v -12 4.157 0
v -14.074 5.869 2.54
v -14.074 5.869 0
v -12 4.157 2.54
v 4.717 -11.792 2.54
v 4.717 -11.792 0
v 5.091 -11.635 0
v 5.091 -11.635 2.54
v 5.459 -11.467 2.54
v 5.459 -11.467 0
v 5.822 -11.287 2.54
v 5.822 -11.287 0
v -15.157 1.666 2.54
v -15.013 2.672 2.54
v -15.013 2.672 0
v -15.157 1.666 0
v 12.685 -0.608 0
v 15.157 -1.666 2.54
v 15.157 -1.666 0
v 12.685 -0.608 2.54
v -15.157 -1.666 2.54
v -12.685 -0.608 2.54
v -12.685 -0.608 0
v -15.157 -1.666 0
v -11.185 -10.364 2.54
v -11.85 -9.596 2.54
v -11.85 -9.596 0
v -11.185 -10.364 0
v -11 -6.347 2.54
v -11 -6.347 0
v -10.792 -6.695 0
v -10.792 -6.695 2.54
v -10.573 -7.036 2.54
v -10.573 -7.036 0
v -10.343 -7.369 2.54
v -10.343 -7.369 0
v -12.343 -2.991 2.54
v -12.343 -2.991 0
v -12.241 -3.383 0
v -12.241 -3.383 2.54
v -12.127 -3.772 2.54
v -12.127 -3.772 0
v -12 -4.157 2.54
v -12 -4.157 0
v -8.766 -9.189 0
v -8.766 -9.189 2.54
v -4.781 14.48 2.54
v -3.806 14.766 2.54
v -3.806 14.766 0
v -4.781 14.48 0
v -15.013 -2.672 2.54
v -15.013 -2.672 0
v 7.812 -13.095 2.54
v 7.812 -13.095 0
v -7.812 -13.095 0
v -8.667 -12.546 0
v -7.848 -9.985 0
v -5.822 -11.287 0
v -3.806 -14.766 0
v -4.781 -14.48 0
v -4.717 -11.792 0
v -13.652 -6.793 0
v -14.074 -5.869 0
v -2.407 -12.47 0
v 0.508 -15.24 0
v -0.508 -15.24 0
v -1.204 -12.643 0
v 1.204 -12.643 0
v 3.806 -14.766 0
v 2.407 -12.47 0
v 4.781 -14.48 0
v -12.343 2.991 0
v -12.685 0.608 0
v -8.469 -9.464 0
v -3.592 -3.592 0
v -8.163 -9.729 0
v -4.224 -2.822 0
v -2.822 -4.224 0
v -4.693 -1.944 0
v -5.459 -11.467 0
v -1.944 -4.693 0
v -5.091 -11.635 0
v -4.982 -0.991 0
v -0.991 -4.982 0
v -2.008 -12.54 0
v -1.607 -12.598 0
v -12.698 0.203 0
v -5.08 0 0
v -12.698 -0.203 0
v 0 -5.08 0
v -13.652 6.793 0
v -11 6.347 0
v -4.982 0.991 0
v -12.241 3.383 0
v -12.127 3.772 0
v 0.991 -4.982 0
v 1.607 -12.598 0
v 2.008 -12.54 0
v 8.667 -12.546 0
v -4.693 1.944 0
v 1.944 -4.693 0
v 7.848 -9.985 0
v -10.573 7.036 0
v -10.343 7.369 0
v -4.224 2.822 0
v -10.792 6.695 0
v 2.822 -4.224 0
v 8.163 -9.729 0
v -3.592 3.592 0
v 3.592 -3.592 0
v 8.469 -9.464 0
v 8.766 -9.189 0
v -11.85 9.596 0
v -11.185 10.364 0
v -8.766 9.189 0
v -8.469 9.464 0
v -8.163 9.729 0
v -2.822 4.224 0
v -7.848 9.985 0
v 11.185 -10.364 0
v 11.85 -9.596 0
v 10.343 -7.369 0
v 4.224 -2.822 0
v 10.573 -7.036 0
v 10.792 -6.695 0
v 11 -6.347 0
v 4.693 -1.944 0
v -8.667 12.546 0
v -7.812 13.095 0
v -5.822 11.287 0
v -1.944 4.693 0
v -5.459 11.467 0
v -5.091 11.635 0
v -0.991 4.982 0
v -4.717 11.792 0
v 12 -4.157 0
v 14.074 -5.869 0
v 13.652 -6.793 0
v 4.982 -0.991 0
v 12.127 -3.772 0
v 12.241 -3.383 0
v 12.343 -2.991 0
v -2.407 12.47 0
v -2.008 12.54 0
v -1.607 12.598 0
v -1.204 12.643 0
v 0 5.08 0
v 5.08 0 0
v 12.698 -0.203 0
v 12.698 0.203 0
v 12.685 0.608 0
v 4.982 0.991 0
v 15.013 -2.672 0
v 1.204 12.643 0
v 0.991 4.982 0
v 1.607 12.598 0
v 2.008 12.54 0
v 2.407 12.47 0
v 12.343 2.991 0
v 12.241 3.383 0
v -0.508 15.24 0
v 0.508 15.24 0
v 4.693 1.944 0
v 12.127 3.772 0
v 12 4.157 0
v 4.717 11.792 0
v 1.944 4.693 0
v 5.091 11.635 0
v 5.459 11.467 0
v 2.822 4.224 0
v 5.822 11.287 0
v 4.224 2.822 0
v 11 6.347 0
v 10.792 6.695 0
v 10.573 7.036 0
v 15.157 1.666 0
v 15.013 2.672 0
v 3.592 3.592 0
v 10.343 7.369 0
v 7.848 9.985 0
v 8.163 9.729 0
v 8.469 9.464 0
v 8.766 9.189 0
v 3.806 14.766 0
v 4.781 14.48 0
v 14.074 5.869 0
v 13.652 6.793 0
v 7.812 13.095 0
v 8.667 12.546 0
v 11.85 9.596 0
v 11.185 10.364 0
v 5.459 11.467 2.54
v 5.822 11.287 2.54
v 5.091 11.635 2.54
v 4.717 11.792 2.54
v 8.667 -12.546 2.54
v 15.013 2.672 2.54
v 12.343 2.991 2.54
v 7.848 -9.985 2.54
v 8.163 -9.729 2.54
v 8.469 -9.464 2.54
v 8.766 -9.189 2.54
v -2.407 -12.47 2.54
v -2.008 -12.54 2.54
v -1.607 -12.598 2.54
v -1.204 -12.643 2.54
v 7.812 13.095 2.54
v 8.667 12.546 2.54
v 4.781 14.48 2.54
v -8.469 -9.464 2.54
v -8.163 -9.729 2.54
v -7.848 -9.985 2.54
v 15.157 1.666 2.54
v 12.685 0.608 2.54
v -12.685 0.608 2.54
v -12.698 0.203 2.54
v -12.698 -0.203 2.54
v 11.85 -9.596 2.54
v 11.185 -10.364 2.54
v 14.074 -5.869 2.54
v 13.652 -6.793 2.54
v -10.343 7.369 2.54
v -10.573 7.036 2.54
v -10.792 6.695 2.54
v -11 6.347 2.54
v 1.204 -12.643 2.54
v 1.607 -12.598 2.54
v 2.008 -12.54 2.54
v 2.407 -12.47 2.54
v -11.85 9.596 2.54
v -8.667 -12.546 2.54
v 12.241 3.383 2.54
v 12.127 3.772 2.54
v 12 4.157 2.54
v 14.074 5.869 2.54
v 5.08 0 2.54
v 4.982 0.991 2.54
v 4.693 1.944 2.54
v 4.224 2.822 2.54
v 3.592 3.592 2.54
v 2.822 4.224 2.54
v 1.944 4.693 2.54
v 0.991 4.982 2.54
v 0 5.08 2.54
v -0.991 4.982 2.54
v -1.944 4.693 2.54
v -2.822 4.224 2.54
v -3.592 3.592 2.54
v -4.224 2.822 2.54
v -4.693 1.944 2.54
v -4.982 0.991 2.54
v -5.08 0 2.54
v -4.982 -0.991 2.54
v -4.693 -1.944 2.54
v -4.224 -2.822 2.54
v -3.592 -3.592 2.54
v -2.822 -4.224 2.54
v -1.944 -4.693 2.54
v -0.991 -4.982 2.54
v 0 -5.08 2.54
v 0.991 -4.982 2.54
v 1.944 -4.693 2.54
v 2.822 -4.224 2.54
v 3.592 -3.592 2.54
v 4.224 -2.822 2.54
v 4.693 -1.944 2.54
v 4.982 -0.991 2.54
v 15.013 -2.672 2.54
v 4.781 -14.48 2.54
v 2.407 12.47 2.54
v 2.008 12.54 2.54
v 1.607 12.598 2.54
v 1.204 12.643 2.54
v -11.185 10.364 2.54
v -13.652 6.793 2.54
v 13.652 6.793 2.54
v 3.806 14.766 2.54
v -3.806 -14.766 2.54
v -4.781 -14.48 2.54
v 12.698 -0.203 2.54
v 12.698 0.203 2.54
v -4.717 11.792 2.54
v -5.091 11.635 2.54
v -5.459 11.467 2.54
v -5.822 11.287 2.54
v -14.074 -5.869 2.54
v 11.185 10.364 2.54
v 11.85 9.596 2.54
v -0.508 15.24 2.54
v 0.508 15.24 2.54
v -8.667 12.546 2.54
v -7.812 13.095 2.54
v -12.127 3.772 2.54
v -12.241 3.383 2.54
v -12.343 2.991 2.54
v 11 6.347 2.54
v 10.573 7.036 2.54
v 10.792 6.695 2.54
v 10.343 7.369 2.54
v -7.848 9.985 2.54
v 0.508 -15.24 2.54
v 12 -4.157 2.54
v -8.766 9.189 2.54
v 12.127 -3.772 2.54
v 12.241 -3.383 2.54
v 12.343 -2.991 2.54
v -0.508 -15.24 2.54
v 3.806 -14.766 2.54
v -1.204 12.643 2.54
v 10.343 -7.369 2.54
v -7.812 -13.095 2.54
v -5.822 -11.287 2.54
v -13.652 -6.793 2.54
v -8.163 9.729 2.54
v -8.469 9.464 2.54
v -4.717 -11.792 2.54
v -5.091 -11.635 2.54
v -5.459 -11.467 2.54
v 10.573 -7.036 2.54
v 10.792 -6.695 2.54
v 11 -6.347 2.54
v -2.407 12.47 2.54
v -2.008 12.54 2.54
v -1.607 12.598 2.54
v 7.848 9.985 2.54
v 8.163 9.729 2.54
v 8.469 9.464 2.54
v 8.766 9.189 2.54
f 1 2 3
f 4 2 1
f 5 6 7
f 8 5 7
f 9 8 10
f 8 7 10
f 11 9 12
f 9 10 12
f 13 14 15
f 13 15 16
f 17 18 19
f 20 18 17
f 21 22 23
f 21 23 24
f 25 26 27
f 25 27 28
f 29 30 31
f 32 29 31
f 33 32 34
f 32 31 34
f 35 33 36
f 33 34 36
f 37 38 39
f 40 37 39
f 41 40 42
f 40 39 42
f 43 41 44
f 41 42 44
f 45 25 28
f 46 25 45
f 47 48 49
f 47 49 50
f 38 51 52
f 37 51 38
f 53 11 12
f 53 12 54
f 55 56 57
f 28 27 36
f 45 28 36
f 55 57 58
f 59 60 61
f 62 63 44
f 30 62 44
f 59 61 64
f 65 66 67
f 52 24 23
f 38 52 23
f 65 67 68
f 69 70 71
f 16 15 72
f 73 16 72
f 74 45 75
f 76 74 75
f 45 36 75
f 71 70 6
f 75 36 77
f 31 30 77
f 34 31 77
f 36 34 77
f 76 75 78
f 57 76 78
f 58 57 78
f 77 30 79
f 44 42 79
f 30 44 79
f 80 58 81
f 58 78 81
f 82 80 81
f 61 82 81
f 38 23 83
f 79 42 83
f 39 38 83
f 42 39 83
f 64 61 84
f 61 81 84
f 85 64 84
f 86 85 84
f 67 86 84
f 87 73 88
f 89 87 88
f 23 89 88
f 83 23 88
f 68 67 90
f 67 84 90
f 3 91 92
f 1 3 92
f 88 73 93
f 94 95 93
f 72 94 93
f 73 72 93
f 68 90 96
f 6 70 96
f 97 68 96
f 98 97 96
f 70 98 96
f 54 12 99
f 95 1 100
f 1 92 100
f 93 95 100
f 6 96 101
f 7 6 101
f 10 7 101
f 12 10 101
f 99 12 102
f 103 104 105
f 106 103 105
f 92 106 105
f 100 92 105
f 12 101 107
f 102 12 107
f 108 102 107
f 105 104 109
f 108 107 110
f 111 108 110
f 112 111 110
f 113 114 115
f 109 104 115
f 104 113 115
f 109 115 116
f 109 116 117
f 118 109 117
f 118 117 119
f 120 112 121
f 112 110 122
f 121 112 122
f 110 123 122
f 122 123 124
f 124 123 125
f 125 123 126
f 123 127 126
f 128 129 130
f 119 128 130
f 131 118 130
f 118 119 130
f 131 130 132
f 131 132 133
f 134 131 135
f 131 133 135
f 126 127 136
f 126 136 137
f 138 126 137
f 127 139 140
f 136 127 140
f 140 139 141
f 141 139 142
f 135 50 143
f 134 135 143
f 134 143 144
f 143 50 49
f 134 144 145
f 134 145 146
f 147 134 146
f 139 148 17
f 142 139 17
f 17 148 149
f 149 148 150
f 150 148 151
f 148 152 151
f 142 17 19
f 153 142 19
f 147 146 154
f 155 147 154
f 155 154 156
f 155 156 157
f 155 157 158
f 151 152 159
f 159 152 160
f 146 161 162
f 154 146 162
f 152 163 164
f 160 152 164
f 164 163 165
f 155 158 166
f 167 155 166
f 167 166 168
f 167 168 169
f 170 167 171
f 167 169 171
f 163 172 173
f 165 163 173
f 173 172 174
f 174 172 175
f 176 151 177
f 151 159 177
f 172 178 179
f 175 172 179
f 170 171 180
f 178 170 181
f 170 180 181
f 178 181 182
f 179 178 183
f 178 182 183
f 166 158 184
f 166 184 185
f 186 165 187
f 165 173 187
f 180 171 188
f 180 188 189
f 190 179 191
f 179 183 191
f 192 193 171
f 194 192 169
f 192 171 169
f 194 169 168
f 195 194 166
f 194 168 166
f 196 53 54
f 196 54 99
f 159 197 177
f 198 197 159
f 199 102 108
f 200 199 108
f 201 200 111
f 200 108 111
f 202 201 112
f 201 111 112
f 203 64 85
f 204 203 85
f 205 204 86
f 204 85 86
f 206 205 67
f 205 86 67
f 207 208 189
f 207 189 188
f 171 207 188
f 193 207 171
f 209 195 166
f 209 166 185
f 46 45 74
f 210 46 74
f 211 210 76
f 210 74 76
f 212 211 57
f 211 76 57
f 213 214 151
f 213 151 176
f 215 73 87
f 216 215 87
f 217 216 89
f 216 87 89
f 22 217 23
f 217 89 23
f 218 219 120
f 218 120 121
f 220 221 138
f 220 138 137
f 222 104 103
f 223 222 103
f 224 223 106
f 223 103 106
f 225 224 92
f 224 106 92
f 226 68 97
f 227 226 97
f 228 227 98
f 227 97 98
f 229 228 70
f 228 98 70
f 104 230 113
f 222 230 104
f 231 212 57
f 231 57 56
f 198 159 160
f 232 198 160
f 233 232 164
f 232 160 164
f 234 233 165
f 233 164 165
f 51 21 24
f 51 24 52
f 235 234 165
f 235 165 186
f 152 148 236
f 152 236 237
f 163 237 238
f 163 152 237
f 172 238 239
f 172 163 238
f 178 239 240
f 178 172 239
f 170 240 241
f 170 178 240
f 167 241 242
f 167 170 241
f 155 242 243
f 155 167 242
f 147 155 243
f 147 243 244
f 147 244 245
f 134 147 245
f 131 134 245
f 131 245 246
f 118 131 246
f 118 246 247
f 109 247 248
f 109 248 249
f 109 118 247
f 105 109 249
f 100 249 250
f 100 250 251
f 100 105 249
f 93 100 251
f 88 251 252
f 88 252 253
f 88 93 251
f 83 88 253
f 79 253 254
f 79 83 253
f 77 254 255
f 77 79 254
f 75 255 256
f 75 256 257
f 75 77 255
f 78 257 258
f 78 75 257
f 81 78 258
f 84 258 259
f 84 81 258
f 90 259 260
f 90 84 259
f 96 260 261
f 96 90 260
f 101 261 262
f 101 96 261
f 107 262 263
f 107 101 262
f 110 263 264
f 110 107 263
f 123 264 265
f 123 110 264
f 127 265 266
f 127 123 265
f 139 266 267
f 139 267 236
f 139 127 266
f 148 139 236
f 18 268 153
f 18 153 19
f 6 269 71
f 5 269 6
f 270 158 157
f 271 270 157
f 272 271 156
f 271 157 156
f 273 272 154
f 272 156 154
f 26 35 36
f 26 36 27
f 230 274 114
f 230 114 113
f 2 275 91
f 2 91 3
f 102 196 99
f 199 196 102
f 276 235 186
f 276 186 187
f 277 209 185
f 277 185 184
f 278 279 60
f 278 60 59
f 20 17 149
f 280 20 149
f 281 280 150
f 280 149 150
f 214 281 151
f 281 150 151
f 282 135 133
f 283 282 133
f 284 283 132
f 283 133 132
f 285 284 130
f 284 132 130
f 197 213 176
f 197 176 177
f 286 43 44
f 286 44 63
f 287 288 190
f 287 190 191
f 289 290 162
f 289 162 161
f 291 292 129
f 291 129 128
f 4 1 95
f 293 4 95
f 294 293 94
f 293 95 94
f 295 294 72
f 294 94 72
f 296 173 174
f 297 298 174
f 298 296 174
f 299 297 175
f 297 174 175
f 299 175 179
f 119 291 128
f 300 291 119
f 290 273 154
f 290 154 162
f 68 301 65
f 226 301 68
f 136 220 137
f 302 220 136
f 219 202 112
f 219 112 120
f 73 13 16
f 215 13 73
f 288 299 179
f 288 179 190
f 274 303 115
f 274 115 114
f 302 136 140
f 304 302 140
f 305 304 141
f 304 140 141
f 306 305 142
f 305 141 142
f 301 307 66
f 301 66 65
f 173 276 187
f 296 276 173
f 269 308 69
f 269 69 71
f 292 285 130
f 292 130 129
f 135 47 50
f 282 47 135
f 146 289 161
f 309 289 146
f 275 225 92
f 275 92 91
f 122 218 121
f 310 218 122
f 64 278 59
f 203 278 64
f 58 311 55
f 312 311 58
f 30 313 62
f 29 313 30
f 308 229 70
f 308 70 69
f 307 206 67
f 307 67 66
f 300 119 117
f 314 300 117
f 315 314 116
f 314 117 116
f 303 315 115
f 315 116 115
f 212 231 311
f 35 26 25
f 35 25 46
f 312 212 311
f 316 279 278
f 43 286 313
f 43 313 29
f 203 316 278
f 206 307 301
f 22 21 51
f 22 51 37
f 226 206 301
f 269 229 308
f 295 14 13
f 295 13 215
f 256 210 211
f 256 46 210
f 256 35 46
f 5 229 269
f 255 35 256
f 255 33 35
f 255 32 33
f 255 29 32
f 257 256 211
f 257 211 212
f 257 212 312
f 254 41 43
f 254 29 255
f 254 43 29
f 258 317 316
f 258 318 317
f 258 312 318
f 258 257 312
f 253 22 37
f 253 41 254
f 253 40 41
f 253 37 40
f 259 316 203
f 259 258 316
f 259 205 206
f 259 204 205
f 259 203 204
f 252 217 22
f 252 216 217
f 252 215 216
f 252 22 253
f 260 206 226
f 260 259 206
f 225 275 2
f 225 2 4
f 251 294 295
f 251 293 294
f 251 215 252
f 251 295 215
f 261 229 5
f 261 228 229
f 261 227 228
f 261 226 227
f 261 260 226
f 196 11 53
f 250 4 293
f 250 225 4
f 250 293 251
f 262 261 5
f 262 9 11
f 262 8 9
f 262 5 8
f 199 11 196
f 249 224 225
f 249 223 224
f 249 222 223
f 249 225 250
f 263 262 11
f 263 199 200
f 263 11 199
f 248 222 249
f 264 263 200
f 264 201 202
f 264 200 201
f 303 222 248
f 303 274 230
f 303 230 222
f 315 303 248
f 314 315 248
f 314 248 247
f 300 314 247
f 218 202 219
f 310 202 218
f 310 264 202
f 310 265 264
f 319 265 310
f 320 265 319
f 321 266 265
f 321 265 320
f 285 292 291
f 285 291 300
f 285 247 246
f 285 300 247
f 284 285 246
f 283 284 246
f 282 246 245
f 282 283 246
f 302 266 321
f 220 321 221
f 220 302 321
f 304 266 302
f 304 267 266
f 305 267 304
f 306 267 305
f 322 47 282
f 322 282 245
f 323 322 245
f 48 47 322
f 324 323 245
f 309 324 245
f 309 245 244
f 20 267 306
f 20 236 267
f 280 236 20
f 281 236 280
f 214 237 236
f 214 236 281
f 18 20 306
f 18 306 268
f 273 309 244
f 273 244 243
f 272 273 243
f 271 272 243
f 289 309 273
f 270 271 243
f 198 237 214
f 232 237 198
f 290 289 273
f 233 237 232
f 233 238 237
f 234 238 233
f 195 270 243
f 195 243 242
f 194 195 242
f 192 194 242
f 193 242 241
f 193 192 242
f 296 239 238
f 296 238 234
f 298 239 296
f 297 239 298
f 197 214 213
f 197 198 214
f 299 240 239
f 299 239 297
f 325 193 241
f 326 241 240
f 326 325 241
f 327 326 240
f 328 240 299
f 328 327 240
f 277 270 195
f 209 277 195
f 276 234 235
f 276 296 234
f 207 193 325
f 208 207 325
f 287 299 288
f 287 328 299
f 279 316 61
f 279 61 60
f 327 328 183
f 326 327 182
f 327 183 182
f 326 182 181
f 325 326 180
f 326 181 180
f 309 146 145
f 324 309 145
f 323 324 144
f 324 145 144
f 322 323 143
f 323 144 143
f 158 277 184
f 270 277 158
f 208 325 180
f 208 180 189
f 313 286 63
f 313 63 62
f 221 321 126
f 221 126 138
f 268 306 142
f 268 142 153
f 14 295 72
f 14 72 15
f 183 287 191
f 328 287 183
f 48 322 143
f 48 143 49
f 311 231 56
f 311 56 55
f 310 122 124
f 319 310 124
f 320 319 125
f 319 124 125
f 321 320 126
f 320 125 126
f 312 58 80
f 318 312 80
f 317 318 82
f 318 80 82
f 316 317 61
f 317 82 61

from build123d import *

# Parameters (mm, degrees)
F0_R            = 12.7
F0_R_2          = 5.08
F1_DEPTH        = 2.54
F3_DEPTH        = 2.54
F3_COPIES_COUNT = 22


# Not quite as in the source:
# - a pattern or mirror of a feature is missing from the dataset's text; its kind, count and spacing are read off the source's solid
# - a feature names something its author has since deleted; it is built from what else it names


with BuildPart() as f1:
    # F0 (on Top) → F1 (new body)
    with BuildSketch(Plane.XY):
        Circle(F0_R)
        Circle(F0_R_2, mode=Mode.SUBTRACT)
    extrude(amount=F1_DEPTH)

    # F2 (on face) → F3 (join)
    with BuildSketch(Plane.XY.offset(2.54)):
        with BuildLine():
            ThreePointArc((-1.2039155713, 12.64280773), (0, 12.7), (1.2039155713, 12.64280773))
            Line((1.2039155713, 12.64280773), (0.508, 15.24))
            Line((0.508, 15.24), (0, 15.24))
            Line((0, 15.24), (-0.508, 15.24))
            Line((-0.508, 15.24), (-1.2039155713, 12.64280773))
        make_face()
    f3 = extrude(amount=-F3_DEPTH)

    # F3_copies: F3 ×22 about axis
    f3_copies_axis = Axis((0, 0, 0), (0, 0, 1))
    for i in range(1, F3_COPIES_COUNT):
        add(f3.rotate(f3_copies_axis, i * 360 / F3_COPIES_COUNT))


solid = f1.part
